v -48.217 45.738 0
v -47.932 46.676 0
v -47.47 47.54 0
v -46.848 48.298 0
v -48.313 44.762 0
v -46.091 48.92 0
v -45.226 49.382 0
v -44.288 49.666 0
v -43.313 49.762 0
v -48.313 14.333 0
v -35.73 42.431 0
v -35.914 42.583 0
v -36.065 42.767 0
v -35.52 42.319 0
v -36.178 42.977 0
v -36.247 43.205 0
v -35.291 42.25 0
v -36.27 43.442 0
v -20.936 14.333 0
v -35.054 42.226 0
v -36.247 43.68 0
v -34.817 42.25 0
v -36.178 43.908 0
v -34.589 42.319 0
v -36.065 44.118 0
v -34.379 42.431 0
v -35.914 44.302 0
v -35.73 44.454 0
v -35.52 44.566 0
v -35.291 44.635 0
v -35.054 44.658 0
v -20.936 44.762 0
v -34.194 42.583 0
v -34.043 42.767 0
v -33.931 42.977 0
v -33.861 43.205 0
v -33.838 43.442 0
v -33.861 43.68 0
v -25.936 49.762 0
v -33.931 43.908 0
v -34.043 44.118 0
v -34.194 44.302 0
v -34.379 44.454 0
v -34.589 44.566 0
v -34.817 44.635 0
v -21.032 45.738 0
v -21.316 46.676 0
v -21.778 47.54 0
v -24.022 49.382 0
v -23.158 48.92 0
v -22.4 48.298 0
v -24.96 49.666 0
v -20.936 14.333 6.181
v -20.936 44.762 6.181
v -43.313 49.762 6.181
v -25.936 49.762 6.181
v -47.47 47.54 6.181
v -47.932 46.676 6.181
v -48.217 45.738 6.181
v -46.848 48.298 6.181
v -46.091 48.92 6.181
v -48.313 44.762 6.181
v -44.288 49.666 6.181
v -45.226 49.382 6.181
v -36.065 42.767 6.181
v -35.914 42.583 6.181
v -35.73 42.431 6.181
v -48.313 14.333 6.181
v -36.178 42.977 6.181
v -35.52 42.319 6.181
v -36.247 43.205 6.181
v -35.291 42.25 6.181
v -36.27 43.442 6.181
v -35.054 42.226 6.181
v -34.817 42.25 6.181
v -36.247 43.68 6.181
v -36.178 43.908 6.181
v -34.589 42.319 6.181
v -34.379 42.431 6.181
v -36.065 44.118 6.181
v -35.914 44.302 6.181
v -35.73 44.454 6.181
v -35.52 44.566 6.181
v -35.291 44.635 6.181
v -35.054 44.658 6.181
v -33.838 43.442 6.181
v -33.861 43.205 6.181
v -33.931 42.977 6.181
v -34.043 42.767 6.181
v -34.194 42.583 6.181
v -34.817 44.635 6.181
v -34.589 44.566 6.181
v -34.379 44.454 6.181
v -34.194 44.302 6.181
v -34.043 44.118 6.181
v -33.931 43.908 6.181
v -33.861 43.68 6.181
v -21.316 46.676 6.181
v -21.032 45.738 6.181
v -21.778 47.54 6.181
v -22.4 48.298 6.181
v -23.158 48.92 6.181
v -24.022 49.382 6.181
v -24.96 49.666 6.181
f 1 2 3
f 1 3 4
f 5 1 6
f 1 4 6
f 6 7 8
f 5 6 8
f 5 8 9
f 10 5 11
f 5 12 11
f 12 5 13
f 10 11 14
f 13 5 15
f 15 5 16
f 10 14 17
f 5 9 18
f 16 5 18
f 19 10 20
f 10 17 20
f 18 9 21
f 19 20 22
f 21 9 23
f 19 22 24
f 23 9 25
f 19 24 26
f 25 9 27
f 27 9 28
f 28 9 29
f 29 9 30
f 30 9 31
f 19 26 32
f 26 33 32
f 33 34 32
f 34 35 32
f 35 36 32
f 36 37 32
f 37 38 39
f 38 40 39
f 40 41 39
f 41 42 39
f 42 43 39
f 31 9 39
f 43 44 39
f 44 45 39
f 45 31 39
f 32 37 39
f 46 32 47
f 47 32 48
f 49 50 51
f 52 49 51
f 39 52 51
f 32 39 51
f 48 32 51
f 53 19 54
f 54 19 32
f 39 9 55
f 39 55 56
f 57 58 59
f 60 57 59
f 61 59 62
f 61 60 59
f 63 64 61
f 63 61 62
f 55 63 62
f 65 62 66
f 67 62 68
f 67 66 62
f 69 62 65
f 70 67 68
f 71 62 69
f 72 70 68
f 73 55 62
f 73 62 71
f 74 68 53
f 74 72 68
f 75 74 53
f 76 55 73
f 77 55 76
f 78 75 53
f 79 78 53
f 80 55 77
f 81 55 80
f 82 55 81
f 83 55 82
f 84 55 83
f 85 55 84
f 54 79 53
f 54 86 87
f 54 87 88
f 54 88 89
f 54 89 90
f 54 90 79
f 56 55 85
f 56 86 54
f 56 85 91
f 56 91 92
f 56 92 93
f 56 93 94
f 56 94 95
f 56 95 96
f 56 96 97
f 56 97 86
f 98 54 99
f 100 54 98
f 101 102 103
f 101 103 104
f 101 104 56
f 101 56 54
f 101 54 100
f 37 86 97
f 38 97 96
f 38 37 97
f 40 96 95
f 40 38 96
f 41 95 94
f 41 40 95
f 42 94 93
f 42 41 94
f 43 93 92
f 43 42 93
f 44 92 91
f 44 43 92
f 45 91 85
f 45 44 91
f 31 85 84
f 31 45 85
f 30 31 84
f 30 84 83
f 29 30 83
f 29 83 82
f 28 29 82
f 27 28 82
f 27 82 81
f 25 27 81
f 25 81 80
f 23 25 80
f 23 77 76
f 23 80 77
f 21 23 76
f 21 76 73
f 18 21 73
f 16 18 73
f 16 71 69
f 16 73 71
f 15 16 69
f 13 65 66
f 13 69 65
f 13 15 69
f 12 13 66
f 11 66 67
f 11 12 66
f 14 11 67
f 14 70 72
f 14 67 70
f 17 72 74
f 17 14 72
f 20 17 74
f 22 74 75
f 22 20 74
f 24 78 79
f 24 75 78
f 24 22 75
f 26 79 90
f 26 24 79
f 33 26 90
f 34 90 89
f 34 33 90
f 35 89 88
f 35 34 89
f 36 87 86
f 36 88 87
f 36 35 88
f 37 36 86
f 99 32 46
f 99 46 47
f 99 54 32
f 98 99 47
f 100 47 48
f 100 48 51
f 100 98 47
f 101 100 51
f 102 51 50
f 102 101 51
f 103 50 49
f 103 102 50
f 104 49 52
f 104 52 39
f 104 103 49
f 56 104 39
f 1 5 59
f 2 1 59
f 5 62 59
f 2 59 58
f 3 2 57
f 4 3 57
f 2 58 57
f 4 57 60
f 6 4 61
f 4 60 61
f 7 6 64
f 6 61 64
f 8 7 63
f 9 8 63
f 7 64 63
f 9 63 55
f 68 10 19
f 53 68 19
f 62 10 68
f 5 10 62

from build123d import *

# Parameters (mm, degrees)
F0_W     = 27.3773
F0_H     = 35.429452
F1_DEPTH = 6.18124
F2_R     = 5
F3_R     = 1.216032
F4_DEPTH = 25


with BuildPart() as f1:
    # F0 (on Top) → F1 (new body)
    with BuildSketch(Plane.XY):
        with Locations((-34.624234, 32.047549)):
            Rectangle(F0_W, F0_H)
    extrude(amount=F1_DEPTH)

    # F2
    f2_edges = [f1.edges().sort_by_distance(p)[0] for p in [
        (-20.935584, 49.762275, 3.09062),
        (-48.312884, 49.762275, 3.09062),
    ]]
    fillet(f2_edges, radius=F2_R)

    # F3 (on Top) → F4 (cut)
    with BuildSketch(Plane.XY):
        with Locations((-35.054151, 43.442421)):
            Circle(F3_R)
    extrude(amount=F4_DEPTH, mode=Mode.SUBTRACT)


solid = f1.part
